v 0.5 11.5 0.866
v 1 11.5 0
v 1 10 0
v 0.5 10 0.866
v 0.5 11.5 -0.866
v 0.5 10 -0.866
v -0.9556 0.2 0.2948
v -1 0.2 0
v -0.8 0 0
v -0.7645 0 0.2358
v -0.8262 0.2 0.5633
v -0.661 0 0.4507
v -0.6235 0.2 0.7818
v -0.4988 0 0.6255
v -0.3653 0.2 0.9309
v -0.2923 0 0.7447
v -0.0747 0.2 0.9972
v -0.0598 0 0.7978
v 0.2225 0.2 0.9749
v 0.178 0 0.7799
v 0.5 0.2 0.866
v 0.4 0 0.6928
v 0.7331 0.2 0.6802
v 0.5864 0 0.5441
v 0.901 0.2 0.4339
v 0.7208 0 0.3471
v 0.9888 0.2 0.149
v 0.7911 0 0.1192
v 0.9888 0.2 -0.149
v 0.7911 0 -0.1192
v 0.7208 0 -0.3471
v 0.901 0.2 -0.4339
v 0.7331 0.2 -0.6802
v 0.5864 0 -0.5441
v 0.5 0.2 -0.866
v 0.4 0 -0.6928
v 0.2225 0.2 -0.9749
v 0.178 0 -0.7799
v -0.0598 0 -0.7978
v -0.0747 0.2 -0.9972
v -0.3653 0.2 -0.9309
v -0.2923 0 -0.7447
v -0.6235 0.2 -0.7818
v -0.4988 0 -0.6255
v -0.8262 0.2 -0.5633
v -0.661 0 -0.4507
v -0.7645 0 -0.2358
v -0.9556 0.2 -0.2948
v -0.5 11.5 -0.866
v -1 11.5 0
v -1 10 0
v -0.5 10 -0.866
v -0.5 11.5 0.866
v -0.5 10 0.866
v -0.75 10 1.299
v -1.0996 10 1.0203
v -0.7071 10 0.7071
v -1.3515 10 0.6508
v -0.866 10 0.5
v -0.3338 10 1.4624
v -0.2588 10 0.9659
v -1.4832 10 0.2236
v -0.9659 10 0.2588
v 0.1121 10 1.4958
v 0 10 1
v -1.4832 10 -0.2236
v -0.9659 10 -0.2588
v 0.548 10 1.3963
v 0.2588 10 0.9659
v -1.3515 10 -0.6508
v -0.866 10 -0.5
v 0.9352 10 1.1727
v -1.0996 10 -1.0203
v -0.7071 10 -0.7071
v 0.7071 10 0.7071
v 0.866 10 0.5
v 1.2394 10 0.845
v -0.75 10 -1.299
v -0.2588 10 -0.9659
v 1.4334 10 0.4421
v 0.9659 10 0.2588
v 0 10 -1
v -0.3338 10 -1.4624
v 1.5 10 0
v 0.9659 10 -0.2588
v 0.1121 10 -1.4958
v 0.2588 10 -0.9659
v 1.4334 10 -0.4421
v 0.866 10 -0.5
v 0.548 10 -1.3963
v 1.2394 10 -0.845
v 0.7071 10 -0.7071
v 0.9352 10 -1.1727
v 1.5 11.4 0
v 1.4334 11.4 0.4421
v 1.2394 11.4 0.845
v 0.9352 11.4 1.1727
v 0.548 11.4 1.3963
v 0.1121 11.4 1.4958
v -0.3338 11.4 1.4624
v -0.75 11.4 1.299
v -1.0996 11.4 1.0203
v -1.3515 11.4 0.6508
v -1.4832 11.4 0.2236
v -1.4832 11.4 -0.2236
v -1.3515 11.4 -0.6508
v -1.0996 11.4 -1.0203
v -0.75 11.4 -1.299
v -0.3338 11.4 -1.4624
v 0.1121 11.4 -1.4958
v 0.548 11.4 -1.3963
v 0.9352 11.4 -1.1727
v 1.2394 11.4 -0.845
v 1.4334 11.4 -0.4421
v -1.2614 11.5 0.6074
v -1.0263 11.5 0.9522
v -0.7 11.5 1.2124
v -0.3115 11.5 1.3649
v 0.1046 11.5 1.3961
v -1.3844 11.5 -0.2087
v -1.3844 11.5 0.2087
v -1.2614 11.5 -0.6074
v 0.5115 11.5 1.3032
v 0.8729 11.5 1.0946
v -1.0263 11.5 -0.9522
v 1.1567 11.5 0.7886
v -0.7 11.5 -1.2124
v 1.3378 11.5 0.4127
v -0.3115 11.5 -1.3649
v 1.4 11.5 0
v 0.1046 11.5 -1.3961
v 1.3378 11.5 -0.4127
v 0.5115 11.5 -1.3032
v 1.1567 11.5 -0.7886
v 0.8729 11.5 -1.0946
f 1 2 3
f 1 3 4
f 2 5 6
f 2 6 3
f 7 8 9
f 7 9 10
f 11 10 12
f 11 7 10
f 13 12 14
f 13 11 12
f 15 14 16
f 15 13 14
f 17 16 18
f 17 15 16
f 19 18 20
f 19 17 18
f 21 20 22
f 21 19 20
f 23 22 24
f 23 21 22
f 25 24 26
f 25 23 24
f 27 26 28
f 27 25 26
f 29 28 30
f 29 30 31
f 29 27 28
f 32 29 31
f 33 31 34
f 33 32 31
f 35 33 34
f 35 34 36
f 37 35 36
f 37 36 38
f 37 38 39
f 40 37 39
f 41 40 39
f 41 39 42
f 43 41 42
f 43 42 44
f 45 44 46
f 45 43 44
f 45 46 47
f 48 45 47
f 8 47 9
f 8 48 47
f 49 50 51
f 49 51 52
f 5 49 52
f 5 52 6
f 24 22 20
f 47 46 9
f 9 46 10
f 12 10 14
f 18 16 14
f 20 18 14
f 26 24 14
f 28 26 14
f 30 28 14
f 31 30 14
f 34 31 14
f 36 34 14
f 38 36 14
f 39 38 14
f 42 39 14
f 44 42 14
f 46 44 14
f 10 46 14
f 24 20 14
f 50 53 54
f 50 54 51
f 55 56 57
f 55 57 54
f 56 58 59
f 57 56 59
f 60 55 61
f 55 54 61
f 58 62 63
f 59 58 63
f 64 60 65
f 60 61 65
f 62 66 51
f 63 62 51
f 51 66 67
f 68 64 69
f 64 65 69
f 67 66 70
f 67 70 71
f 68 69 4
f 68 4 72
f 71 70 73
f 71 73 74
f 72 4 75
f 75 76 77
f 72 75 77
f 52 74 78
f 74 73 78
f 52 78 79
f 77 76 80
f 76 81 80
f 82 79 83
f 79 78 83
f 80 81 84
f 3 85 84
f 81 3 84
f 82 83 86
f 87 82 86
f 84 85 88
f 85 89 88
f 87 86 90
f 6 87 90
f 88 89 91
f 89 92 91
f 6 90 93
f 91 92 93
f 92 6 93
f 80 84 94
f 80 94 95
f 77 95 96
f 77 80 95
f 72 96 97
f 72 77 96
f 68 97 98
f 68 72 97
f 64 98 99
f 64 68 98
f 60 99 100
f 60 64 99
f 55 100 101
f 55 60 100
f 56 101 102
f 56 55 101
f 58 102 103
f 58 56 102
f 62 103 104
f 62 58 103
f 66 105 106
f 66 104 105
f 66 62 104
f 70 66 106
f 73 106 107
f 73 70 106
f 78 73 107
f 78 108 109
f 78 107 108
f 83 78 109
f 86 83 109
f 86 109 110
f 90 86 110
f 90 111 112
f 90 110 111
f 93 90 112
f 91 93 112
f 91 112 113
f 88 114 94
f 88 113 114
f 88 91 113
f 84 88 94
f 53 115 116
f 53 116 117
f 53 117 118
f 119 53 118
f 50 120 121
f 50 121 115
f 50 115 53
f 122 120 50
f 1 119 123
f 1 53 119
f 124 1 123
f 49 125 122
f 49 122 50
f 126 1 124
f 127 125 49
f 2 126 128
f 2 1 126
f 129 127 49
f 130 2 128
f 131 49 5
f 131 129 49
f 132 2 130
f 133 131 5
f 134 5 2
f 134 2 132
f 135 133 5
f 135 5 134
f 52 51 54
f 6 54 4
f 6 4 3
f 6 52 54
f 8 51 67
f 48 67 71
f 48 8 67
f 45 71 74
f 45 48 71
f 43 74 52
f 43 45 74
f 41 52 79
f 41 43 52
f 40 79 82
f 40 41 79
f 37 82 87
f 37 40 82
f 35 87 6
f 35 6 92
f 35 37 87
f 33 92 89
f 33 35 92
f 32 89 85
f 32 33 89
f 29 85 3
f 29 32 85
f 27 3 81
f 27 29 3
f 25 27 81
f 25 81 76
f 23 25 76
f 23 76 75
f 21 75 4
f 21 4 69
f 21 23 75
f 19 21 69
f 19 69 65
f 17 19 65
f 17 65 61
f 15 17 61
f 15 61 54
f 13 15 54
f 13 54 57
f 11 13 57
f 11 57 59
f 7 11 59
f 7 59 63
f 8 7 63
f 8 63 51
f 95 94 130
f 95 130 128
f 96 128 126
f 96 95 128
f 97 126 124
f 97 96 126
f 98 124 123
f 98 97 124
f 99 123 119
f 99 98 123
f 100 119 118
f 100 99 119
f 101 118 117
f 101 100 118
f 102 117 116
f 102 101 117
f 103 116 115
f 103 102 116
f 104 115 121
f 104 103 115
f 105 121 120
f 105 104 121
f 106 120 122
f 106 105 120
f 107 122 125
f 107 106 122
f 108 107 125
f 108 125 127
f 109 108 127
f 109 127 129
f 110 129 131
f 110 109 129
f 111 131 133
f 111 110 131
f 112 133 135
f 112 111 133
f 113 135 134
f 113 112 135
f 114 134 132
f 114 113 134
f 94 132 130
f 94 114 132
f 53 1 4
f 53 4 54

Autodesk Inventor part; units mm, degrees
ref_plane "YZ Plane" through (0, 0, 0) normal (1, 0, 0) x (0, 1, 0)
ref_plane "XZ Plane" through (0, 0, 0) normal (0, 1, 0) x (-1, 0, 0)
ref_plane "XY Plane" through (0, 0, 0) normal (0, 0, 1) x (1, 0, 0)
sketch "Sketch1" plane through (0, 0, 0) normal (0, 1, 0) x (-1, 0, 0)
  circle A0 centre (0, 0) radius 1
  dimension "d0" = 2
extrude "Extrusion1" add sketch "Sketch1" along normal blind 10
sketch "Sketch2" plane through (0, 10, 0) normal (0, 1, 0) x (1, 0, 0)
  circle A0 centre (0, 0) radius 1.5
  dimension "d3" = 3
extrude "Extrusion2" add sketch "Sketch2" along normal blind 1.5
sketch "Sketch3" plane through (0, 11.5, 0) normal (0, 1, 0) x (1, 0, 0)
  circle A0 centre (0, 0) radius 1 projected
  line L0 (-1, 0) -> (-0.5, 0.866)
  line L1 (-0.5, 0.866) -> (0.5, 0.866)
  line L2 (0.5, 0.866) -> (1, 0)
  line L3 (1, 0) -> (0.5, -0.866)
  line L4 (0.5, -0.866) -> (-0.5, -0.866)
  line L5 (-0.5, -0.866) -> (-1, 0)
extrude "Extrusion3" cut sketch "Sketch3" against normal blind 1.5 contours L3 L4 L5 L0 L1 L2
chamfer "Chamfer1" distance 0.2 angle 45 1 edges at (1, 0, 0)
chamfer "Chamfer2" distance 0.1 angle 45 1 edges at (-1.5, 11.5, 0)
thread "Thread1" size "M2x0.4" class "6g" standard "ANSI Metric M Profile" full length
properties part number "LCD Screw" material "Stainless Steel"
